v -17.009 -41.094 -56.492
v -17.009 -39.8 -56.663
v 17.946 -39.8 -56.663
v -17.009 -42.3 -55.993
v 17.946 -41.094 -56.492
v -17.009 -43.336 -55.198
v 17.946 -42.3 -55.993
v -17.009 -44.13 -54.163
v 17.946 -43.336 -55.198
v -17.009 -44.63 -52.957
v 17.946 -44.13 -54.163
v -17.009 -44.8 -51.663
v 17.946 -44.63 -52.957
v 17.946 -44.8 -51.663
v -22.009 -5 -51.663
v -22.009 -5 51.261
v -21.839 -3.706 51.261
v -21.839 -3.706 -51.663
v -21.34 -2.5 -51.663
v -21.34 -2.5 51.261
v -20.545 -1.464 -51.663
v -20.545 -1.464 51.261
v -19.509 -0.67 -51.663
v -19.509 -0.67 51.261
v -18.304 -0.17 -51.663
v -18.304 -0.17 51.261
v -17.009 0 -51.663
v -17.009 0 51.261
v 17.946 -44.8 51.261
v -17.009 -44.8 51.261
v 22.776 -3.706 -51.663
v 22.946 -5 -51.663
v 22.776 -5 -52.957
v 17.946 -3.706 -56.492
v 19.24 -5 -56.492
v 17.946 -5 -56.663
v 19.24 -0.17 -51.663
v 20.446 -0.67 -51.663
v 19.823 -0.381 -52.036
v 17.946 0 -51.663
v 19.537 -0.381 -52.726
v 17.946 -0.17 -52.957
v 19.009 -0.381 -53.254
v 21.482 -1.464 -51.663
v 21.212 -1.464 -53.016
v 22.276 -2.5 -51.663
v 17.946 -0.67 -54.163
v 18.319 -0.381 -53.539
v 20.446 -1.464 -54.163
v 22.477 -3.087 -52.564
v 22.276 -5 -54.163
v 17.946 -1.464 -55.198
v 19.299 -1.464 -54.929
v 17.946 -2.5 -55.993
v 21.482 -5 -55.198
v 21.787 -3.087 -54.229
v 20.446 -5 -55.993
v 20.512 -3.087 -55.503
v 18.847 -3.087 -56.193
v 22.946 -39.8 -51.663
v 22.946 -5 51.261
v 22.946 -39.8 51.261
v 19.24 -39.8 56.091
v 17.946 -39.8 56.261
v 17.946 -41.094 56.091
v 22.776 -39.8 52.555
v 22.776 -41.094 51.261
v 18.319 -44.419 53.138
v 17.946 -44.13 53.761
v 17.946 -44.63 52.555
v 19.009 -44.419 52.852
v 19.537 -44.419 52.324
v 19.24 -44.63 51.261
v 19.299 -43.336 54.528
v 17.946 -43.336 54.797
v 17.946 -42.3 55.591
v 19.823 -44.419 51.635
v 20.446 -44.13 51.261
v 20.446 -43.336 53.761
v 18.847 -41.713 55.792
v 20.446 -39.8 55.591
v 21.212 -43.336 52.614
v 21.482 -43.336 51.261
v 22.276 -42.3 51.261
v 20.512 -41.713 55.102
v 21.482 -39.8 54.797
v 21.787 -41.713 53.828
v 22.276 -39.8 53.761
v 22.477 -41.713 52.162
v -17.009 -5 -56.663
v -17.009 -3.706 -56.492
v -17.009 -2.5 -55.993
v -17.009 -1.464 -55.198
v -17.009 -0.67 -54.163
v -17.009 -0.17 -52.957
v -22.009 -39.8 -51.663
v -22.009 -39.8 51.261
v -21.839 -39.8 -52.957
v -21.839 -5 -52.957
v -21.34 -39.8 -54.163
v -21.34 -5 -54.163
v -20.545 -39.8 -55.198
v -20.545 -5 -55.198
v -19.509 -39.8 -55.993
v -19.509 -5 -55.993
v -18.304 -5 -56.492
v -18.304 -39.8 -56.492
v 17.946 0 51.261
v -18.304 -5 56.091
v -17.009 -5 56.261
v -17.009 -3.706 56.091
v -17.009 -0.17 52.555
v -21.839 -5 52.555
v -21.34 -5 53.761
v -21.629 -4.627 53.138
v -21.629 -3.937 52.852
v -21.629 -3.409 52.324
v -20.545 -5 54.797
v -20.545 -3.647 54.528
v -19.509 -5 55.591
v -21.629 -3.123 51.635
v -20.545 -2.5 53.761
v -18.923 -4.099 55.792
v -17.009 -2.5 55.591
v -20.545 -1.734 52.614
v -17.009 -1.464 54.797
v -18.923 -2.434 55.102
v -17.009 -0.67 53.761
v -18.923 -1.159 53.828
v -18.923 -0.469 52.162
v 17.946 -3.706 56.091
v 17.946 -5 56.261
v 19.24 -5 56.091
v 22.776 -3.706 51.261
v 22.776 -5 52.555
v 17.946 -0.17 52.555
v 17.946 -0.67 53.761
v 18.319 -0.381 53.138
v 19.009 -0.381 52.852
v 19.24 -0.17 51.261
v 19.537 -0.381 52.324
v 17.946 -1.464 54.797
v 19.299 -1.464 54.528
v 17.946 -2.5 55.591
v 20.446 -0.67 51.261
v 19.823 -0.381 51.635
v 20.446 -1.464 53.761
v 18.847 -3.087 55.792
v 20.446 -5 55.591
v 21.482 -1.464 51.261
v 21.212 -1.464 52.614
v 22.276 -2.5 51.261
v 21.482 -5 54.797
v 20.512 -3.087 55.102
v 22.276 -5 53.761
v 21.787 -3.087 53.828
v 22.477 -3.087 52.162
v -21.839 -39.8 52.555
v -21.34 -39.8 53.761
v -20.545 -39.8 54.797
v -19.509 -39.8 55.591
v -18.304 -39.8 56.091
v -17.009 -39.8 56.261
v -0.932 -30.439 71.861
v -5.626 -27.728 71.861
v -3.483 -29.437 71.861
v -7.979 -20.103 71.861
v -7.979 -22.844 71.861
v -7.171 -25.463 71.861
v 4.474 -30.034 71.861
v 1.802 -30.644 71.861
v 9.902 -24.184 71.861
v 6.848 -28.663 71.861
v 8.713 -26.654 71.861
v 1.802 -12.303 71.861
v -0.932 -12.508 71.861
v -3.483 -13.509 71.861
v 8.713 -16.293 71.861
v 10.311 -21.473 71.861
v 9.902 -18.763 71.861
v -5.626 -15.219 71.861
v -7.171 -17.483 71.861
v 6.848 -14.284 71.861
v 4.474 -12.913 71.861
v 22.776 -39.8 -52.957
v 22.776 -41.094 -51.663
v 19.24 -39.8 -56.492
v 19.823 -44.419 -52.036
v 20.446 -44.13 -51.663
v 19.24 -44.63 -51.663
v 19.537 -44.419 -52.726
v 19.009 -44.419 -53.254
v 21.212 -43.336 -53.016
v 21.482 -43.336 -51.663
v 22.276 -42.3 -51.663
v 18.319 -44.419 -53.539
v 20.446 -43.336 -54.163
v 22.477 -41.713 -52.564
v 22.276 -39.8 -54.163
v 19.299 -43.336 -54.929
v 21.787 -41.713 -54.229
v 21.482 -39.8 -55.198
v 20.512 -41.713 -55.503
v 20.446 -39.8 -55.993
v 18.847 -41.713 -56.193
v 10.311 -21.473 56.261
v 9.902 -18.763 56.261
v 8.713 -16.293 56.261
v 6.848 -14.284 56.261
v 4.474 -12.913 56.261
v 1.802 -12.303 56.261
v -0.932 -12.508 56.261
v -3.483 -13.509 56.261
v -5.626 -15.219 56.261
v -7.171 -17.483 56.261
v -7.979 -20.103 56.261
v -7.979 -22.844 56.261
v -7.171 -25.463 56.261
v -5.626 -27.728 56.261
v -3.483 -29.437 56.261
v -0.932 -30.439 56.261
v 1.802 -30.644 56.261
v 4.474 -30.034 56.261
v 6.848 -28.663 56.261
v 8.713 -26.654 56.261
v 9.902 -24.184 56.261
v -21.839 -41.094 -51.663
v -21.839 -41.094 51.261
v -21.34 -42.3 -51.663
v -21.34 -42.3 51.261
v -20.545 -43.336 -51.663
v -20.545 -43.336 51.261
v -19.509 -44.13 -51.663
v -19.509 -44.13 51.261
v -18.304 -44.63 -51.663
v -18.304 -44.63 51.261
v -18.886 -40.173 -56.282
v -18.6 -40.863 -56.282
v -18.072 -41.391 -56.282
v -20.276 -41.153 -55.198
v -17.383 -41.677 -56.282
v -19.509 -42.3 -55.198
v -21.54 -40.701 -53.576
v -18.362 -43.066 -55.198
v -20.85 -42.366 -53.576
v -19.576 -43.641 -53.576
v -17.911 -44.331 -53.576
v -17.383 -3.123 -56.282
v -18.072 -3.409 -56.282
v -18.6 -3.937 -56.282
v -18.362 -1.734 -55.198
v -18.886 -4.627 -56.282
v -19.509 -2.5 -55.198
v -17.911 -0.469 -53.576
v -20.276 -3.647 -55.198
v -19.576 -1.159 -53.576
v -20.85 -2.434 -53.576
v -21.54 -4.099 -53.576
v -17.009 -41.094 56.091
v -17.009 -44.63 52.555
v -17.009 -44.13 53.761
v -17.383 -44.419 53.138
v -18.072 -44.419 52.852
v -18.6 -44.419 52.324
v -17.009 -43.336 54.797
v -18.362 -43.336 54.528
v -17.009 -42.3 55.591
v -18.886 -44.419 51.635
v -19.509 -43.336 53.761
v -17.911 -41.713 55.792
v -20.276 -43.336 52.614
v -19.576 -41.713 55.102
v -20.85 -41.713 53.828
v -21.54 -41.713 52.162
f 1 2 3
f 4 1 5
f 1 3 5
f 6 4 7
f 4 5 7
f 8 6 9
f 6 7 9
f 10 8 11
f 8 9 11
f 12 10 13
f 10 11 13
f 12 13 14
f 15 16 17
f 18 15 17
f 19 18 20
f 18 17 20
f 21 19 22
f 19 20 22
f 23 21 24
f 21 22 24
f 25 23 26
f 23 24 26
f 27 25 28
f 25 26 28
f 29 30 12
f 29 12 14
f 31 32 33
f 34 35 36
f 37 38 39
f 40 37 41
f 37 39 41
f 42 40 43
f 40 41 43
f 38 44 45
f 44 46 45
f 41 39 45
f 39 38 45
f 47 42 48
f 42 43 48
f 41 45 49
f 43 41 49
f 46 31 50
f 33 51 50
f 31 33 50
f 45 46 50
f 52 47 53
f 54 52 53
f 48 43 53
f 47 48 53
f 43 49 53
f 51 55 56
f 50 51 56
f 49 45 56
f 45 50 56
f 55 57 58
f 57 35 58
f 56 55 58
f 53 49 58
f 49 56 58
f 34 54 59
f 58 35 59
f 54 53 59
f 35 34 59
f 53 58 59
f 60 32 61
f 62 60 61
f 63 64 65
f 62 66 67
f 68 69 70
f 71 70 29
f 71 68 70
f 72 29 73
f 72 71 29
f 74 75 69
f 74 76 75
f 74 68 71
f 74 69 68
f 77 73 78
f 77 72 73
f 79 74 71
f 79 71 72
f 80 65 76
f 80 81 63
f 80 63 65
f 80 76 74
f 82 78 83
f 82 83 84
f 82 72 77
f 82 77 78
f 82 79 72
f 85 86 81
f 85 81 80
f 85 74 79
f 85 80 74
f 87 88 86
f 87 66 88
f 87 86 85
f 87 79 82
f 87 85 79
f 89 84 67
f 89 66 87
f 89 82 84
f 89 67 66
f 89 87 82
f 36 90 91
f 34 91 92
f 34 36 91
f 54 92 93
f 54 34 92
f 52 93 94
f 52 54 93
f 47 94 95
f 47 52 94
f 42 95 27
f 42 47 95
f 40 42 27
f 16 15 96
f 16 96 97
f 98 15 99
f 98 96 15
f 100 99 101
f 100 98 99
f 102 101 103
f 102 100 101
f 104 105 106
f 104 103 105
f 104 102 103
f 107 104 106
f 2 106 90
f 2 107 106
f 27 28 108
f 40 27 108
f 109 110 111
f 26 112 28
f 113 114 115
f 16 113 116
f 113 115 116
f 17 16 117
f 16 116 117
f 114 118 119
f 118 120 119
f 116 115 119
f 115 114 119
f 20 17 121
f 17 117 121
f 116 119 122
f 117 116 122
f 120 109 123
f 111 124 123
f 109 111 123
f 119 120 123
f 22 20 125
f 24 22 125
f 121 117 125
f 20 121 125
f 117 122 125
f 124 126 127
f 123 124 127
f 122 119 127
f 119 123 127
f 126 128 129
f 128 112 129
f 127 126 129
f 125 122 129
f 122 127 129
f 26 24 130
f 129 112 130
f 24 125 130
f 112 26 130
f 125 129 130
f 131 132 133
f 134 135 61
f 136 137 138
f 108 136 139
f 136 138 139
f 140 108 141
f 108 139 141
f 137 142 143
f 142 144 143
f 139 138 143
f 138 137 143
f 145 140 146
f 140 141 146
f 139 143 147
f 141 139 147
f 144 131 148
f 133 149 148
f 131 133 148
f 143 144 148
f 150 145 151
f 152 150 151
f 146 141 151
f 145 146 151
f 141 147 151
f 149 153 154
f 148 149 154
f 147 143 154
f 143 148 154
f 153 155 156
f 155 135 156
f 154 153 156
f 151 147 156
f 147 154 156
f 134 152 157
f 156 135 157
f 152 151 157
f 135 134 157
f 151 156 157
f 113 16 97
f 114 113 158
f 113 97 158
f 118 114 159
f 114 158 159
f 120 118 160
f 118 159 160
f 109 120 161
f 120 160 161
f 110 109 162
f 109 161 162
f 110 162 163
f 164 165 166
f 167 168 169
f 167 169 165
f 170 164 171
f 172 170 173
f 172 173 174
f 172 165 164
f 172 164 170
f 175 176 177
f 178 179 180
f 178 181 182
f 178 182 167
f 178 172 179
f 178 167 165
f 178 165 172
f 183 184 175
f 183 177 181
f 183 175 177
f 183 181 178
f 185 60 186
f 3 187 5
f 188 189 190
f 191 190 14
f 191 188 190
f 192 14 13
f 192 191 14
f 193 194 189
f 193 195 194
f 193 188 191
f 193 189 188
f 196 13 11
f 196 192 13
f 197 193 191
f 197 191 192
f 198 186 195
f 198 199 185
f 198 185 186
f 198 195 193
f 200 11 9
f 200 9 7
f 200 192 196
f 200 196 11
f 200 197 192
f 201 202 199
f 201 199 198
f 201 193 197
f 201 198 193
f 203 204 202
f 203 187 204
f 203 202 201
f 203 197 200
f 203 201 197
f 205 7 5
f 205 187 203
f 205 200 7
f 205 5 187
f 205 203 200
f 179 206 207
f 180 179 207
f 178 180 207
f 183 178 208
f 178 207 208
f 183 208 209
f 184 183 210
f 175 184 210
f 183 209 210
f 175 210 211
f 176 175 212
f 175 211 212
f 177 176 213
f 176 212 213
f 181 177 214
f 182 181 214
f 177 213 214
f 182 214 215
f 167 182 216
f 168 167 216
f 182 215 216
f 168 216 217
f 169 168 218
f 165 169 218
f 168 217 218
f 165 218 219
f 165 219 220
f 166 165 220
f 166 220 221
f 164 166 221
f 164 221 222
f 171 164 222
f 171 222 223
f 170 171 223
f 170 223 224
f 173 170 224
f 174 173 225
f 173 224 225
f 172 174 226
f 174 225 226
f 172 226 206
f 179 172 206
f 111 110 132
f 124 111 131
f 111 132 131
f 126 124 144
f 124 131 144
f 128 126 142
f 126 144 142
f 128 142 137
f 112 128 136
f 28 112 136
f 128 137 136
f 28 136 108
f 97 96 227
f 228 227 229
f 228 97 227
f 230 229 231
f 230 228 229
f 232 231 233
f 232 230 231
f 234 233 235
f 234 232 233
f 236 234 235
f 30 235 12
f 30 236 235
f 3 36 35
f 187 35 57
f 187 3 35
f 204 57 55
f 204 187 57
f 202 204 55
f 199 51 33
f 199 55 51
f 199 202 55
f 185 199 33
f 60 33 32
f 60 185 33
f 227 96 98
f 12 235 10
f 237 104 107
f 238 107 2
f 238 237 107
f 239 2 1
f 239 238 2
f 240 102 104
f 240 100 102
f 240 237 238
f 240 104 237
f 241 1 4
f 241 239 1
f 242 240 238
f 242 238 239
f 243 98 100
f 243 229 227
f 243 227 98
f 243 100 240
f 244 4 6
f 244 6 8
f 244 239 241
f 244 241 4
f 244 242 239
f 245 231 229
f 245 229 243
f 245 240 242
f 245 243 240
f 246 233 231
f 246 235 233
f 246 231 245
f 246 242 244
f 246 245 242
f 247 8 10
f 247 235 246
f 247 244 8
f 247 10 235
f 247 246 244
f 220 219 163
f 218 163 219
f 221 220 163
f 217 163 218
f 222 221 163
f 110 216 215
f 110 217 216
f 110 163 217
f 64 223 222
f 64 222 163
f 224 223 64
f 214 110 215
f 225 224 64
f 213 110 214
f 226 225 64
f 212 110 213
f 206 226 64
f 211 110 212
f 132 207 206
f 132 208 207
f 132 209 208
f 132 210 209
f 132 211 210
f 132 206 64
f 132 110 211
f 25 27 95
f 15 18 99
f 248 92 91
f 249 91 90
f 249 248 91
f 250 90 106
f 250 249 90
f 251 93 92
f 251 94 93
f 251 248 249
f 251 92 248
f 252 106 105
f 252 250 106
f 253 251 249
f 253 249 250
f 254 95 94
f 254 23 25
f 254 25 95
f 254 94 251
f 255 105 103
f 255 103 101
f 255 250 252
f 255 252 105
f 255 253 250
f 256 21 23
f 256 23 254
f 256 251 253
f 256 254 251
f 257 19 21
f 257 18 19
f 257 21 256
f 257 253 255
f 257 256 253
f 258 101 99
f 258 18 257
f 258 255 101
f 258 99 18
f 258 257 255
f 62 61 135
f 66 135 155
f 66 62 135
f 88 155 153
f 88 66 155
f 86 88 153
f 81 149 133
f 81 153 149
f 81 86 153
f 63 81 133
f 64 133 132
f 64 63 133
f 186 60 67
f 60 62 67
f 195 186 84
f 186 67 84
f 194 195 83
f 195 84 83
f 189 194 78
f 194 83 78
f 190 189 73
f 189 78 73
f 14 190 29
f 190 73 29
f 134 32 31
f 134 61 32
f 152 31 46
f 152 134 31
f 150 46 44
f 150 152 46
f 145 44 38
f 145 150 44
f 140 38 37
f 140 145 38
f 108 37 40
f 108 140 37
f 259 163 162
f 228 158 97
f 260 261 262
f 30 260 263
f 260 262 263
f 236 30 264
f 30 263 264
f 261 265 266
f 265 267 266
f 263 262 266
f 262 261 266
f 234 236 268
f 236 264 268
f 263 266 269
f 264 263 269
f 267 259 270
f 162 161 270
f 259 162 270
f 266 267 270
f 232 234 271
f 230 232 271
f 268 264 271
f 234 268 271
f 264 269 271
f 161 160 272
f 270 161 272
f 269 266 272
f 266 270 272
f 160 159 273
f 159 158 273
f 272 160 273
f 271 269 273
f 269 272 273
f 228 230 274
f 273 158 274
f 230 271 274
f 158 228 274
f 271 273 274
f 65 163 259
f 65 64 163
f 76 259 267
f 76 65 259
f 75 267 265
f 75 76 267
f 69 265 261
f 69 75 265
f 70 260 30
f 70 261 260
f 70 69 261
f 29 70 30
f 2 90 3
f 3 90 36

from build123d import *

# Parameters (mm, degrees)
F0_W     = 44.955451
F0_H     = 112.923815
F1_DEPTH = 44.8
F2_R     = 5
F3_R     = 9.195935
F4_DEPTH = 15.6


with BuildPart() as f1:
    # F0 (on Front) → F1 (new body)
    with BuildSketch(Plane.XZ):
        with Locations((0.468286, -0.200692)):
            Rectangle(F0_W, F0_H)
    extrude(amount=F1_DEPTH)

    # F2
    f2_edges = [f1.edges().sort_by_distance(p)[0] for p in [
        (22.946011, -22.4, 56.261215),
        (0.468286, 0, 56.261215),
        (-22.00944, -22.4, 56.261215),
        (0.468286, -44.8, 56.261215),
        (22.946011, -22.4, -56.6626),
        (22.946011, -44.8, -0.200693),
        (22.946011, 0, -0.200693),
        (-22.00944, 0, -0.200693),
        (0.468286, 0, -56.6626),
        (-22.00944, -44.8, -0.200693),
        (-22.00944, -22.4, -56.6626),
        (0.468286, -44.8, -56.6626),
    ]]
    fillet(f2_edges, radius=F2_R)

    # F3 (on face) → F4 (join)
    with BuildSketch(Plane.XY.offset(56.261215)):
        with Locations((1.114632, -21.473374)):
            Circle(F3_R)
    extrude(amount=F4_DEPTH)


solid = f1.part
